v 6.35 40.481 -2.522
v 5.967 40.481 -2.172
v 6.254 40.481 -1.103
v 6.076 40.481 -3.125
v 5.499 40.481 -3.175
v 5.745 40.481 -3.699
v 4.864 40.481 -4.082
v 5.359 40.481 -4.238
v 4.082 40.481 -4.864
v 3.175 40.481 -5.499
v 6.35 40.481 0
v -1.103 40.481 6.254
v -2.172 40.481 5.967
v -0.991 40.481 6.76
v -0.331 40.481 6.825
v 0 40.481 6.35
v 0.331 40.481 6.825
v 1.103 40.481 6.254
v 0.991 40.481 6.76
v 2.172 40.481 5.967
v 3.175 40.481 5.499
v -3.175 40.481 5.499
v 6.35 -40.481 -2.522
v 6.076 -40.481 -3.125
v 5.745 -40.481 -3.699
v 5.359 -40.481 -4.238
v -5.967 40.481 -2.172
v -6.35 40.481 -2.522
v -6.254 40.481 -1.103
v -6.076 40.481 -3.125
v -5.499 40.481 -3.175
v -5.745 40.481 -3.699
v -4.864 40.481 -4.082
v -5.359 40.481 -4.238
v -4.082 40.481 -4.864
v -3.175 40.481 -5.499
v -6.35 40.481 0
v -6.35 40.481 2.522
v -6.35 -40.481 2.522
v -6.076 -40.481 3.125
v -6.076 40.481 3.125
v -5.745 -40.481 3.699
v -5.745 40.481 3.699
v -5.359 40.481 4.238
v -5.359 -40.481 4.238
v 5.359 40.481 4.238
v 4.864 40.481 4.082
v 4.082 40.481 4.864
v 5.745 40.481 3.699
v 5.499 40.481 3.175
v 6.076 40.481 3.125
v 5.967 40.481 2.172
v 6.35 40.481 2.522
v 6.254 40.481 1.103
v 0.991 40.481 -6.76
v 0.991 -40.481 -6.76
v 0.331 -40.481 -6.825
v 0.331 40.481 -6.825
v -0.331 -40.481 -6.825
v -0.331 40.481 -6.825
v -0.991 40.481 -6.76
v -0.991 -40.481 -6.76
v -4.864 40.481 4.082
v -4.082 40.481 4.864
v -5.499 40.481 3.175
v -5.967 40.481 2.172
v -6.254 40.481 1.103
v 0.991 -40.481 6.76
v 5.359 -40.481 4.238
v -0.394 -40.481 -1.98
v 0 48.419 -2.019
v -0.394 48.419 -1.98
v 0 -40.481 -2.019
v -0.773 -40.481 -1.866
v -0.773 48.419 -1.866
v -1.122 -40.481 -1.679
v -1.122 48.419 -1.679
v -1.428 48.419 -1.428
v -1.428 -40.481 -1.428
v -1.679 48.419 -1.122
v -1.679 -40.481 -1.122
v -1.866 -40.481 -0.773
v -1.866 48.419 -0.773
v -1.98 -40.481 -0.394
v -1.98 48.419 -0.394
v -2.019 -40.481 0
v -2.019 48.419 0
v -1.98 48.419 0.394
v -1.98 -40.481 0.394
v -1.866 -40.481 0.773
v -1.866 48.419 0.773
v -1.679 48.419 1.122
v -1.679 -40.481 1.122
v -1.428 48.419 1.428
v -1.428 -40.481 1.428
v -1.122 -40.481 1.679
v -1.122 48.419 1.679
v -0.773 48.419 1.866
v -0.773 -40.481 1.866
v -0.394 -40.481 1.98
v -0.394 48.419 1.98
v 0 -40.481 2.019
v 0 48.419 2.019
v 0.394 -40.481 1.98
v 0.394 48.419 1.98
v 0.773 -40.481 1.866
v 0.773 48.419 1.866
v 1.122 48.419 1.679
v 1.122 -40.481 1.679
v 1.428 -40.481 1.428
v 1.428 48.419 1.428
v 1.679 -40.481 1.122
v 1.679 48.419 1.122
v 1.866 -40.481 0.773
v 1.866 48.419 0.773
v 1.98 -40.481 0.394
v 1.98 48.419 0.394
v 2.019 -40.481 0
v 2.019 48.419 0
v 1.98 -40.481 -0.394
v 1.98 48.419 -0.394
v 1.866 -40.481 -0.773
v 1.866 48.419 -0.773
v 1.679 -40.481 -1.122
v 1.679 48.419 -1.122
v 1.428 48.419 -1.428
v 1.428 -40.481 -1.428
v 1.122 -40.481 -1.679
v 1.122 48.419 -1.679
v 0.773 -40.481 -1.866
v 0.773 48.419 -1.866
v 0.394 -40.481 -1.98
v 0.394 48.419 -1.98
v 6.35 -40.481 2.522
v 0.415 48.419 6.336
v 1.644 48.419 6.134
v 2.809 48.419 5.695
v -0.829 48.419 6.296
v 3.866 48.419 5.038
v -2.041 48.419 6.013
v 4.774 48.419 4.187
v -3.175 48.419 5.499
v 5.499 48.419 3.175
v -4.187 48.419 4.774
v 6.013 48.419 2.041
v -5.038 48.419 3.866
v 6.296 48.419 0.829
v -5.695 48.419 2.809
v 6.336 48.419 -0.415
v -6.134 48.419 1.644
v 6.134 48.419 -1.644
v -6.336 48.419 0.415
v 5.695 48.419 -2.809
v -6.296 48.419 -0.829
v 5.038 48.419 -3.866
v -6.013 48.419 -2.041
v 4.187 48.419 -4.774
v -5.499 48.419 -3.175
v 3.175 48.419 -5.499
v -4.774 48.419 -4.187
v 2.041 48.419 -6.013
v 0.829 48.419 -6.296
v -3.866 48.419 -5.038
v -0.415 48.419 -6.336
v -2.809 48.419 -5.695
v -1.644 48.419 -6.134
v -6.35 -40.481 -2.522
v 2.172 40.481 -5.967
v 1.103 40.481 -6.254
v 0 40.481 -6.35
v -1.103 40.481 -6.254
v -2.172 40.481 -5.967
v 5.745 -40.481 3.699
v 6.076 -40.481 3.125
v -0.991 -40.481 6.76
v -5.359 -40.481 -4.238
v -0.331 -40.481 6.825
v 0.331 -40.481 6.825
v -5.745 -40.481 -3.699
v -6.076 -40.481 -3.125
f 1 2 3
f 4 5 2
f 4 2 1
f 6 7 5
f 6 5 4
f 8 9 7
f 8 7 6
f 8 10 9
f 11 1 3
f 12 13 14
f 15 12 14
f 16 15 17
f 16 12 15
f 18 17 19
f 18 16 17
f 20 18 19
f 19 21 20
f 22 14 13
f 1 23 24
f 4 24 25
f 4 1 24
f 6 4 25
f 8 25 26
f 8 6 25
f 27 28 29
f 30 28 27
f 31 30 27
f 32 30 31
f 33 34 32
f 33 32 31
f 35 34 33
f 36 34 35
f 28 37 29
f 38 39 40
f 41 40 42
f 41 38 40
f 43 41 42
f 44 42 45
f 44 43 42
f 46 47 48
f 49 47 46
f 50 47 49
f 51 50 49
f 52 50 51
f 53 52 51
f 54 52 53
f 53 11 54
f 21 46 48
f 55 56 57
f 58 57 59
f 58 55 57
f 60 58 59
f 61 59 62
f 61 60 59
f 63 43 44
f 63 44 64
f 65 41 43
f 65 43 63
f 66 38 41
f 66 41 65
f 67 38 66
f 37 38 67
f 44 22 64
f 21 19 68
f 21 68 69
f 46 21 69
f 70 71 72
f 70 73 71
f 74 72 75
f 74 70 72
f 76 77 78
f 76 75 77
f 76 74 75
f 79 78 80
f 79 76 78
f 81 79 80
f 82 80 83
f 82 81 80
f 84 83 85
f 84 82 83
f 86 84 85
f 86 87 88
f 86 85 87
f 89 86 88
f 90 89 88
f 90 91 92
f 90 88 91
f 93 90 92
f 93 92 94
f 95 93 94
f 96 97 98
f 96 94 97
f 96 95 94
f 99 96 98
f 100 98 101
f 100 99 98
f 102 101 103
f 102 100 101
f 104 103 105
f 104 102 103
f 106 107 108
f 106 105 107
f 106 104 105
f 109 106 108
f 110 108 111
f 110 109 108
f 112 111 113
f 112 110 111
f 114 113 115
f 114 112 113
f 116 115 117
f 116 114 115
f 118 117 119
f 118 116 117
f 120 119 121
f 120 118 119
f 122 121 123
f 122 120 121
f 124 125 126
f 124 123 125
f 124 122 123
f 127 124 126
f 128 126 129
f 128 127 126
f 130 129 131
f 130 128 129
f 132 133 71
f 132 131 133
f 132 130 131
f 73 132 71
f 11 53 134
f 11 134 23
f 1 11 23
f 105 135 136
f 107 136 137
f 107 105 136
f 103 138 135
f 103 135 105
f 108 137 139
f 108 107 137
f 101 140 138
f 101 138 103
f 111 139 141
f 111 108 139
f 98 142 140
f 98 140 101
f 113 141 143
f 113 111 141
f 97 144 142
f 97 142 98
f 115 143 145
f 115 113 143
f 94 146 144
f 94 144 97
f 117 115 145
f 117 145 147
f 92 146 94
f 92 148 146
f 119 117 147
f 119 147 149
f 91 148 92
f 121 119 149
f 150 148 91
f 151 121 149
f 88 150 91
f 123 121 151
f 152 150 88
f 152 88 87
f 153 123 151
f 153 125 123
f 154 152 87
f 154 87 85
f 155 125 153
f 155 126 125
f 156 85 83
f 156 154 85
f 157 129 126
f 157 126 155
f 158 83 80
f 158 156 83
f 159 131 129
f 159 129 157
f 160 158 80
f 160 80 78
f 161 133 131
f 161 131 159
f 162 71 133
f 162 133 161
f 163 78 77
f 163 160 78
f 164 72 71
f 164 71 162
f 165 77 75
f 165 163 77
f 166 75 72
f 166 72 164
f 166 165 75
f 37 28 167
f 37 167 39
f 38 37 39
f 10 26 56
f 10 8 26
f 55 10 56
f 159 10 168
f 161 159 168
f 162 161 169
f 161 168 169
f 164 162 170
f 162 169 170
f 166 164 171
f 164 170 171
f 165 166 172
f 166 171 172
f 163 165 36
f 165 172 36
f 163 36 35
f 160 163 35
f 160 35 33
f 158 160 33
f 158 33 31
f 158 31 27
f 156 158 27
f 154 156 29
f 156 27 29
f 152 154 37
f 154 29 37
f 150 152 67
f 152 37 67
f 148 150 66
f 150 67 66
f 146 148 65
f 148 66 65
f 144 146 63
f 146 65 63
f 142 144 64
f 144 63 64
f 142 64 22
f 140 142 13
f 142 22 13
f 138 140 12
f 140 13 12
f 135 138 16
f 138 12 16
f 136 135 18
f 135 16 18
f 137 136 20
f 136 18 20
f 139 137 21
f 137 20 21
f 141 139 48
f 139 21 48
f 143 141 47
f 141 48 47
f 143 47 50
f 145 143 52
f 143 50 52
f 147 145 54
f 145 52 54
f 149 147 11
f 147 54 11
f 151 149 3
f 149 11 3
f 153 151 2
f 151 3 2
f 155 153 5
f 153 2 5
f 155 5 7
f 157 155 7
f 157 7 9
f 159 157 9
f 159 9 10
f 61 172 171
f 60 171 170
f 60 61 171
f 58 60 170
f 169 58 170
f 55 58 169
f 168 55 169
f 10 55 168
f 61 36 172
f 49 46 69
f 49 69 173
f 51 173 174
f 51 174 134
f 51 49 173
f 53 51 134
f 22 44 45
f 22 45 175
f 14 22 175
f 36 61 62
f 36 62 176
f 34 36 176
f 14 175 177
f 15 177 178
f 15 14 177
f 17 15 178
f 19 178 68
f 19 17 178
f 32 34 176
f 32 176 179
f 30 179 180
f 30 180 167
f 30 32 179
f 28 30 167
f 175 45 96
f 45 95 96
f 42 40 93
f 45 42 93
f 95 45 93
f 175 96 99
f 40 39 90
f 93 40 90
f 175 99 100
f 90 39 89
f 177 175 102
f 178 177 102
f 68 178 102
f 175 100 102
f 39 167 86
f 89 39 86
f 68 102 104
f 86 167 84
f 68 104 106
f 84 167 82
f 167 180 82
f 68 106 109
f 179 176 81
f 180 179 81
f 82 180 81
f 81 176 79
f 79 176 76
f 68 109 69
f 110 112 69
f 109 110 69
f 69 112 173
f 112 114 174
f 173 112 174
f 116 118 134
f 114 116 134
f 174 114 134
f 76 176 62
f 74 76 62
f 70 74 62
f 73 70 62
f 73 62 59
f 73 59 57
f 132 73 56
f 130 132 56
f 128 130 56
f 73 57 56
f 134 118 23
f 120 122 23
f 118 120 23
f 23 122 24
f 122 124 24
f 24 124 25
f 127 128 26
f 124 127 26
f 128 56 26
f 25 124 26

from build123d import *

# Parameters (mm, degrees)
BOSS_EXTRUDE1_DEPTH        = 40.48125
SKETCH3_R                  = 6.35
BOSS_EXTRUDE2_DEPTH        = 7.9375
F_10_32_TAPPED_HOLE1_D     = 4.0386
F_10_32_TAPPED_HOLE1_DEPTH = 12.02944
F_10_32_TAPPED_HOLE1_TIP   = 1.213317848
SKETCH2_R                  = 2.0193
CUT_EXTRUDE1_DEPTH         = 90.388013306


with BuildPart() as part:
    # Sketch1 → Boss-Extrude1 (new, symmetric)
    with BuildSketch(Plane(origin=(0, 0, 0), x_dir=(1, 0, 0), z_dir=(0, 1, 0))):
        with BuildLine():
            ThreePointArc((0.990636919, 6.760403927), (0, 6.8326), (-0.990636919, 6.760403927))
            Line((-0.990636919, 6.760403927), (-5.359363081, 4.238118701))
            ThreePointArc((-5.359363081, 4.238118701), (-5.917205174, 3.4163), (-6.35, 2.522285226))
            Line((-6.35, 2.522285226), (-6.35, -2.522285226))
            ThreePointArc((-6.35, -2.522285226), (-5.917205174, -3.4163), (-5.359363081, -4.238118701))
            Line((-5.359363081, -4.238118701), (-0.990636919, -6.760403927))
            ThreePointArc((-0.990636919, -6.760403927), (0, -6.8326), (0.990636919, -6.760403927))
            Line((0.990636919, -6.760403927), (5.359363081, -4.238118701))
            ThreePointArc((5.359363081, -4.238118701), (5.917205174, -3.4163), (6.35, -2.522285226))
            Line((6.35, -2.522285226), (6.35, 2.522285226))
            ThreePointArc((6.35, 2.522285226), (5.917205174, 3.4163), (5.359363081, 4.238118701))
            Line((5.359363081, 4.238118701), (0.990636919, 6.760403927))
        make_face()
    extrude(amount=BOSS_EXTRUDE1_DEPTH, both=True)

    # Sketch3 → Boss-Extrude2 (add)
    with BuildSketch(Plane(origin=(0, 40.48125, 0), x_dir=(1, 0, 0), z_dir=(0, 1, 0))):
        with Locations(Location((0, 0, 0), (0, 0, 60))):
            Circle(SKETCH3_R)
    extrude(amount=BOSS_EXTRUDE2_DEPTH)

    # #10-32 Tapped Hole1
    with Locations(Plane(origin=(0, -40.48125, 0), x_dir=(-1, 0, 0), z_dir=(0, -1, 0))):
        with Locations((0, 0)):
            Hole(F_10_32_TAPPED_HOLE1_D / 2, depth=F_10_32_TAPPED_HOLE1_DEPTH)
            with Locations((0, 0, -(F_10_32_TAPPED_HOLE1_DEPTH + F_10_32_TAPPED_HOLE1_TIP / 2))):  # 118° drill point
                Cone(0, F_10_32_TAPPED_HOLE1_D / 2, F_10_32_TAPPED_HOLE1_TIP, mode=Mode.SUBTRACT)

    # Sketch2 → Cut-Extrude1 (cut, through all)
    with BuildSketch(Plane(origin=(0, -40.48125, 0), x_dir=(1, 0, 0), z_dir=(0, 1, 0))):
        with Locations(Location((0, 0, 0), (0, 0, 90))):
            Circle(SKETCH2_R)
    extrude(amount=CUT_EXTRUDE1_DEPTH, mode=Mode.SUBTRACT)


solid = part.part
